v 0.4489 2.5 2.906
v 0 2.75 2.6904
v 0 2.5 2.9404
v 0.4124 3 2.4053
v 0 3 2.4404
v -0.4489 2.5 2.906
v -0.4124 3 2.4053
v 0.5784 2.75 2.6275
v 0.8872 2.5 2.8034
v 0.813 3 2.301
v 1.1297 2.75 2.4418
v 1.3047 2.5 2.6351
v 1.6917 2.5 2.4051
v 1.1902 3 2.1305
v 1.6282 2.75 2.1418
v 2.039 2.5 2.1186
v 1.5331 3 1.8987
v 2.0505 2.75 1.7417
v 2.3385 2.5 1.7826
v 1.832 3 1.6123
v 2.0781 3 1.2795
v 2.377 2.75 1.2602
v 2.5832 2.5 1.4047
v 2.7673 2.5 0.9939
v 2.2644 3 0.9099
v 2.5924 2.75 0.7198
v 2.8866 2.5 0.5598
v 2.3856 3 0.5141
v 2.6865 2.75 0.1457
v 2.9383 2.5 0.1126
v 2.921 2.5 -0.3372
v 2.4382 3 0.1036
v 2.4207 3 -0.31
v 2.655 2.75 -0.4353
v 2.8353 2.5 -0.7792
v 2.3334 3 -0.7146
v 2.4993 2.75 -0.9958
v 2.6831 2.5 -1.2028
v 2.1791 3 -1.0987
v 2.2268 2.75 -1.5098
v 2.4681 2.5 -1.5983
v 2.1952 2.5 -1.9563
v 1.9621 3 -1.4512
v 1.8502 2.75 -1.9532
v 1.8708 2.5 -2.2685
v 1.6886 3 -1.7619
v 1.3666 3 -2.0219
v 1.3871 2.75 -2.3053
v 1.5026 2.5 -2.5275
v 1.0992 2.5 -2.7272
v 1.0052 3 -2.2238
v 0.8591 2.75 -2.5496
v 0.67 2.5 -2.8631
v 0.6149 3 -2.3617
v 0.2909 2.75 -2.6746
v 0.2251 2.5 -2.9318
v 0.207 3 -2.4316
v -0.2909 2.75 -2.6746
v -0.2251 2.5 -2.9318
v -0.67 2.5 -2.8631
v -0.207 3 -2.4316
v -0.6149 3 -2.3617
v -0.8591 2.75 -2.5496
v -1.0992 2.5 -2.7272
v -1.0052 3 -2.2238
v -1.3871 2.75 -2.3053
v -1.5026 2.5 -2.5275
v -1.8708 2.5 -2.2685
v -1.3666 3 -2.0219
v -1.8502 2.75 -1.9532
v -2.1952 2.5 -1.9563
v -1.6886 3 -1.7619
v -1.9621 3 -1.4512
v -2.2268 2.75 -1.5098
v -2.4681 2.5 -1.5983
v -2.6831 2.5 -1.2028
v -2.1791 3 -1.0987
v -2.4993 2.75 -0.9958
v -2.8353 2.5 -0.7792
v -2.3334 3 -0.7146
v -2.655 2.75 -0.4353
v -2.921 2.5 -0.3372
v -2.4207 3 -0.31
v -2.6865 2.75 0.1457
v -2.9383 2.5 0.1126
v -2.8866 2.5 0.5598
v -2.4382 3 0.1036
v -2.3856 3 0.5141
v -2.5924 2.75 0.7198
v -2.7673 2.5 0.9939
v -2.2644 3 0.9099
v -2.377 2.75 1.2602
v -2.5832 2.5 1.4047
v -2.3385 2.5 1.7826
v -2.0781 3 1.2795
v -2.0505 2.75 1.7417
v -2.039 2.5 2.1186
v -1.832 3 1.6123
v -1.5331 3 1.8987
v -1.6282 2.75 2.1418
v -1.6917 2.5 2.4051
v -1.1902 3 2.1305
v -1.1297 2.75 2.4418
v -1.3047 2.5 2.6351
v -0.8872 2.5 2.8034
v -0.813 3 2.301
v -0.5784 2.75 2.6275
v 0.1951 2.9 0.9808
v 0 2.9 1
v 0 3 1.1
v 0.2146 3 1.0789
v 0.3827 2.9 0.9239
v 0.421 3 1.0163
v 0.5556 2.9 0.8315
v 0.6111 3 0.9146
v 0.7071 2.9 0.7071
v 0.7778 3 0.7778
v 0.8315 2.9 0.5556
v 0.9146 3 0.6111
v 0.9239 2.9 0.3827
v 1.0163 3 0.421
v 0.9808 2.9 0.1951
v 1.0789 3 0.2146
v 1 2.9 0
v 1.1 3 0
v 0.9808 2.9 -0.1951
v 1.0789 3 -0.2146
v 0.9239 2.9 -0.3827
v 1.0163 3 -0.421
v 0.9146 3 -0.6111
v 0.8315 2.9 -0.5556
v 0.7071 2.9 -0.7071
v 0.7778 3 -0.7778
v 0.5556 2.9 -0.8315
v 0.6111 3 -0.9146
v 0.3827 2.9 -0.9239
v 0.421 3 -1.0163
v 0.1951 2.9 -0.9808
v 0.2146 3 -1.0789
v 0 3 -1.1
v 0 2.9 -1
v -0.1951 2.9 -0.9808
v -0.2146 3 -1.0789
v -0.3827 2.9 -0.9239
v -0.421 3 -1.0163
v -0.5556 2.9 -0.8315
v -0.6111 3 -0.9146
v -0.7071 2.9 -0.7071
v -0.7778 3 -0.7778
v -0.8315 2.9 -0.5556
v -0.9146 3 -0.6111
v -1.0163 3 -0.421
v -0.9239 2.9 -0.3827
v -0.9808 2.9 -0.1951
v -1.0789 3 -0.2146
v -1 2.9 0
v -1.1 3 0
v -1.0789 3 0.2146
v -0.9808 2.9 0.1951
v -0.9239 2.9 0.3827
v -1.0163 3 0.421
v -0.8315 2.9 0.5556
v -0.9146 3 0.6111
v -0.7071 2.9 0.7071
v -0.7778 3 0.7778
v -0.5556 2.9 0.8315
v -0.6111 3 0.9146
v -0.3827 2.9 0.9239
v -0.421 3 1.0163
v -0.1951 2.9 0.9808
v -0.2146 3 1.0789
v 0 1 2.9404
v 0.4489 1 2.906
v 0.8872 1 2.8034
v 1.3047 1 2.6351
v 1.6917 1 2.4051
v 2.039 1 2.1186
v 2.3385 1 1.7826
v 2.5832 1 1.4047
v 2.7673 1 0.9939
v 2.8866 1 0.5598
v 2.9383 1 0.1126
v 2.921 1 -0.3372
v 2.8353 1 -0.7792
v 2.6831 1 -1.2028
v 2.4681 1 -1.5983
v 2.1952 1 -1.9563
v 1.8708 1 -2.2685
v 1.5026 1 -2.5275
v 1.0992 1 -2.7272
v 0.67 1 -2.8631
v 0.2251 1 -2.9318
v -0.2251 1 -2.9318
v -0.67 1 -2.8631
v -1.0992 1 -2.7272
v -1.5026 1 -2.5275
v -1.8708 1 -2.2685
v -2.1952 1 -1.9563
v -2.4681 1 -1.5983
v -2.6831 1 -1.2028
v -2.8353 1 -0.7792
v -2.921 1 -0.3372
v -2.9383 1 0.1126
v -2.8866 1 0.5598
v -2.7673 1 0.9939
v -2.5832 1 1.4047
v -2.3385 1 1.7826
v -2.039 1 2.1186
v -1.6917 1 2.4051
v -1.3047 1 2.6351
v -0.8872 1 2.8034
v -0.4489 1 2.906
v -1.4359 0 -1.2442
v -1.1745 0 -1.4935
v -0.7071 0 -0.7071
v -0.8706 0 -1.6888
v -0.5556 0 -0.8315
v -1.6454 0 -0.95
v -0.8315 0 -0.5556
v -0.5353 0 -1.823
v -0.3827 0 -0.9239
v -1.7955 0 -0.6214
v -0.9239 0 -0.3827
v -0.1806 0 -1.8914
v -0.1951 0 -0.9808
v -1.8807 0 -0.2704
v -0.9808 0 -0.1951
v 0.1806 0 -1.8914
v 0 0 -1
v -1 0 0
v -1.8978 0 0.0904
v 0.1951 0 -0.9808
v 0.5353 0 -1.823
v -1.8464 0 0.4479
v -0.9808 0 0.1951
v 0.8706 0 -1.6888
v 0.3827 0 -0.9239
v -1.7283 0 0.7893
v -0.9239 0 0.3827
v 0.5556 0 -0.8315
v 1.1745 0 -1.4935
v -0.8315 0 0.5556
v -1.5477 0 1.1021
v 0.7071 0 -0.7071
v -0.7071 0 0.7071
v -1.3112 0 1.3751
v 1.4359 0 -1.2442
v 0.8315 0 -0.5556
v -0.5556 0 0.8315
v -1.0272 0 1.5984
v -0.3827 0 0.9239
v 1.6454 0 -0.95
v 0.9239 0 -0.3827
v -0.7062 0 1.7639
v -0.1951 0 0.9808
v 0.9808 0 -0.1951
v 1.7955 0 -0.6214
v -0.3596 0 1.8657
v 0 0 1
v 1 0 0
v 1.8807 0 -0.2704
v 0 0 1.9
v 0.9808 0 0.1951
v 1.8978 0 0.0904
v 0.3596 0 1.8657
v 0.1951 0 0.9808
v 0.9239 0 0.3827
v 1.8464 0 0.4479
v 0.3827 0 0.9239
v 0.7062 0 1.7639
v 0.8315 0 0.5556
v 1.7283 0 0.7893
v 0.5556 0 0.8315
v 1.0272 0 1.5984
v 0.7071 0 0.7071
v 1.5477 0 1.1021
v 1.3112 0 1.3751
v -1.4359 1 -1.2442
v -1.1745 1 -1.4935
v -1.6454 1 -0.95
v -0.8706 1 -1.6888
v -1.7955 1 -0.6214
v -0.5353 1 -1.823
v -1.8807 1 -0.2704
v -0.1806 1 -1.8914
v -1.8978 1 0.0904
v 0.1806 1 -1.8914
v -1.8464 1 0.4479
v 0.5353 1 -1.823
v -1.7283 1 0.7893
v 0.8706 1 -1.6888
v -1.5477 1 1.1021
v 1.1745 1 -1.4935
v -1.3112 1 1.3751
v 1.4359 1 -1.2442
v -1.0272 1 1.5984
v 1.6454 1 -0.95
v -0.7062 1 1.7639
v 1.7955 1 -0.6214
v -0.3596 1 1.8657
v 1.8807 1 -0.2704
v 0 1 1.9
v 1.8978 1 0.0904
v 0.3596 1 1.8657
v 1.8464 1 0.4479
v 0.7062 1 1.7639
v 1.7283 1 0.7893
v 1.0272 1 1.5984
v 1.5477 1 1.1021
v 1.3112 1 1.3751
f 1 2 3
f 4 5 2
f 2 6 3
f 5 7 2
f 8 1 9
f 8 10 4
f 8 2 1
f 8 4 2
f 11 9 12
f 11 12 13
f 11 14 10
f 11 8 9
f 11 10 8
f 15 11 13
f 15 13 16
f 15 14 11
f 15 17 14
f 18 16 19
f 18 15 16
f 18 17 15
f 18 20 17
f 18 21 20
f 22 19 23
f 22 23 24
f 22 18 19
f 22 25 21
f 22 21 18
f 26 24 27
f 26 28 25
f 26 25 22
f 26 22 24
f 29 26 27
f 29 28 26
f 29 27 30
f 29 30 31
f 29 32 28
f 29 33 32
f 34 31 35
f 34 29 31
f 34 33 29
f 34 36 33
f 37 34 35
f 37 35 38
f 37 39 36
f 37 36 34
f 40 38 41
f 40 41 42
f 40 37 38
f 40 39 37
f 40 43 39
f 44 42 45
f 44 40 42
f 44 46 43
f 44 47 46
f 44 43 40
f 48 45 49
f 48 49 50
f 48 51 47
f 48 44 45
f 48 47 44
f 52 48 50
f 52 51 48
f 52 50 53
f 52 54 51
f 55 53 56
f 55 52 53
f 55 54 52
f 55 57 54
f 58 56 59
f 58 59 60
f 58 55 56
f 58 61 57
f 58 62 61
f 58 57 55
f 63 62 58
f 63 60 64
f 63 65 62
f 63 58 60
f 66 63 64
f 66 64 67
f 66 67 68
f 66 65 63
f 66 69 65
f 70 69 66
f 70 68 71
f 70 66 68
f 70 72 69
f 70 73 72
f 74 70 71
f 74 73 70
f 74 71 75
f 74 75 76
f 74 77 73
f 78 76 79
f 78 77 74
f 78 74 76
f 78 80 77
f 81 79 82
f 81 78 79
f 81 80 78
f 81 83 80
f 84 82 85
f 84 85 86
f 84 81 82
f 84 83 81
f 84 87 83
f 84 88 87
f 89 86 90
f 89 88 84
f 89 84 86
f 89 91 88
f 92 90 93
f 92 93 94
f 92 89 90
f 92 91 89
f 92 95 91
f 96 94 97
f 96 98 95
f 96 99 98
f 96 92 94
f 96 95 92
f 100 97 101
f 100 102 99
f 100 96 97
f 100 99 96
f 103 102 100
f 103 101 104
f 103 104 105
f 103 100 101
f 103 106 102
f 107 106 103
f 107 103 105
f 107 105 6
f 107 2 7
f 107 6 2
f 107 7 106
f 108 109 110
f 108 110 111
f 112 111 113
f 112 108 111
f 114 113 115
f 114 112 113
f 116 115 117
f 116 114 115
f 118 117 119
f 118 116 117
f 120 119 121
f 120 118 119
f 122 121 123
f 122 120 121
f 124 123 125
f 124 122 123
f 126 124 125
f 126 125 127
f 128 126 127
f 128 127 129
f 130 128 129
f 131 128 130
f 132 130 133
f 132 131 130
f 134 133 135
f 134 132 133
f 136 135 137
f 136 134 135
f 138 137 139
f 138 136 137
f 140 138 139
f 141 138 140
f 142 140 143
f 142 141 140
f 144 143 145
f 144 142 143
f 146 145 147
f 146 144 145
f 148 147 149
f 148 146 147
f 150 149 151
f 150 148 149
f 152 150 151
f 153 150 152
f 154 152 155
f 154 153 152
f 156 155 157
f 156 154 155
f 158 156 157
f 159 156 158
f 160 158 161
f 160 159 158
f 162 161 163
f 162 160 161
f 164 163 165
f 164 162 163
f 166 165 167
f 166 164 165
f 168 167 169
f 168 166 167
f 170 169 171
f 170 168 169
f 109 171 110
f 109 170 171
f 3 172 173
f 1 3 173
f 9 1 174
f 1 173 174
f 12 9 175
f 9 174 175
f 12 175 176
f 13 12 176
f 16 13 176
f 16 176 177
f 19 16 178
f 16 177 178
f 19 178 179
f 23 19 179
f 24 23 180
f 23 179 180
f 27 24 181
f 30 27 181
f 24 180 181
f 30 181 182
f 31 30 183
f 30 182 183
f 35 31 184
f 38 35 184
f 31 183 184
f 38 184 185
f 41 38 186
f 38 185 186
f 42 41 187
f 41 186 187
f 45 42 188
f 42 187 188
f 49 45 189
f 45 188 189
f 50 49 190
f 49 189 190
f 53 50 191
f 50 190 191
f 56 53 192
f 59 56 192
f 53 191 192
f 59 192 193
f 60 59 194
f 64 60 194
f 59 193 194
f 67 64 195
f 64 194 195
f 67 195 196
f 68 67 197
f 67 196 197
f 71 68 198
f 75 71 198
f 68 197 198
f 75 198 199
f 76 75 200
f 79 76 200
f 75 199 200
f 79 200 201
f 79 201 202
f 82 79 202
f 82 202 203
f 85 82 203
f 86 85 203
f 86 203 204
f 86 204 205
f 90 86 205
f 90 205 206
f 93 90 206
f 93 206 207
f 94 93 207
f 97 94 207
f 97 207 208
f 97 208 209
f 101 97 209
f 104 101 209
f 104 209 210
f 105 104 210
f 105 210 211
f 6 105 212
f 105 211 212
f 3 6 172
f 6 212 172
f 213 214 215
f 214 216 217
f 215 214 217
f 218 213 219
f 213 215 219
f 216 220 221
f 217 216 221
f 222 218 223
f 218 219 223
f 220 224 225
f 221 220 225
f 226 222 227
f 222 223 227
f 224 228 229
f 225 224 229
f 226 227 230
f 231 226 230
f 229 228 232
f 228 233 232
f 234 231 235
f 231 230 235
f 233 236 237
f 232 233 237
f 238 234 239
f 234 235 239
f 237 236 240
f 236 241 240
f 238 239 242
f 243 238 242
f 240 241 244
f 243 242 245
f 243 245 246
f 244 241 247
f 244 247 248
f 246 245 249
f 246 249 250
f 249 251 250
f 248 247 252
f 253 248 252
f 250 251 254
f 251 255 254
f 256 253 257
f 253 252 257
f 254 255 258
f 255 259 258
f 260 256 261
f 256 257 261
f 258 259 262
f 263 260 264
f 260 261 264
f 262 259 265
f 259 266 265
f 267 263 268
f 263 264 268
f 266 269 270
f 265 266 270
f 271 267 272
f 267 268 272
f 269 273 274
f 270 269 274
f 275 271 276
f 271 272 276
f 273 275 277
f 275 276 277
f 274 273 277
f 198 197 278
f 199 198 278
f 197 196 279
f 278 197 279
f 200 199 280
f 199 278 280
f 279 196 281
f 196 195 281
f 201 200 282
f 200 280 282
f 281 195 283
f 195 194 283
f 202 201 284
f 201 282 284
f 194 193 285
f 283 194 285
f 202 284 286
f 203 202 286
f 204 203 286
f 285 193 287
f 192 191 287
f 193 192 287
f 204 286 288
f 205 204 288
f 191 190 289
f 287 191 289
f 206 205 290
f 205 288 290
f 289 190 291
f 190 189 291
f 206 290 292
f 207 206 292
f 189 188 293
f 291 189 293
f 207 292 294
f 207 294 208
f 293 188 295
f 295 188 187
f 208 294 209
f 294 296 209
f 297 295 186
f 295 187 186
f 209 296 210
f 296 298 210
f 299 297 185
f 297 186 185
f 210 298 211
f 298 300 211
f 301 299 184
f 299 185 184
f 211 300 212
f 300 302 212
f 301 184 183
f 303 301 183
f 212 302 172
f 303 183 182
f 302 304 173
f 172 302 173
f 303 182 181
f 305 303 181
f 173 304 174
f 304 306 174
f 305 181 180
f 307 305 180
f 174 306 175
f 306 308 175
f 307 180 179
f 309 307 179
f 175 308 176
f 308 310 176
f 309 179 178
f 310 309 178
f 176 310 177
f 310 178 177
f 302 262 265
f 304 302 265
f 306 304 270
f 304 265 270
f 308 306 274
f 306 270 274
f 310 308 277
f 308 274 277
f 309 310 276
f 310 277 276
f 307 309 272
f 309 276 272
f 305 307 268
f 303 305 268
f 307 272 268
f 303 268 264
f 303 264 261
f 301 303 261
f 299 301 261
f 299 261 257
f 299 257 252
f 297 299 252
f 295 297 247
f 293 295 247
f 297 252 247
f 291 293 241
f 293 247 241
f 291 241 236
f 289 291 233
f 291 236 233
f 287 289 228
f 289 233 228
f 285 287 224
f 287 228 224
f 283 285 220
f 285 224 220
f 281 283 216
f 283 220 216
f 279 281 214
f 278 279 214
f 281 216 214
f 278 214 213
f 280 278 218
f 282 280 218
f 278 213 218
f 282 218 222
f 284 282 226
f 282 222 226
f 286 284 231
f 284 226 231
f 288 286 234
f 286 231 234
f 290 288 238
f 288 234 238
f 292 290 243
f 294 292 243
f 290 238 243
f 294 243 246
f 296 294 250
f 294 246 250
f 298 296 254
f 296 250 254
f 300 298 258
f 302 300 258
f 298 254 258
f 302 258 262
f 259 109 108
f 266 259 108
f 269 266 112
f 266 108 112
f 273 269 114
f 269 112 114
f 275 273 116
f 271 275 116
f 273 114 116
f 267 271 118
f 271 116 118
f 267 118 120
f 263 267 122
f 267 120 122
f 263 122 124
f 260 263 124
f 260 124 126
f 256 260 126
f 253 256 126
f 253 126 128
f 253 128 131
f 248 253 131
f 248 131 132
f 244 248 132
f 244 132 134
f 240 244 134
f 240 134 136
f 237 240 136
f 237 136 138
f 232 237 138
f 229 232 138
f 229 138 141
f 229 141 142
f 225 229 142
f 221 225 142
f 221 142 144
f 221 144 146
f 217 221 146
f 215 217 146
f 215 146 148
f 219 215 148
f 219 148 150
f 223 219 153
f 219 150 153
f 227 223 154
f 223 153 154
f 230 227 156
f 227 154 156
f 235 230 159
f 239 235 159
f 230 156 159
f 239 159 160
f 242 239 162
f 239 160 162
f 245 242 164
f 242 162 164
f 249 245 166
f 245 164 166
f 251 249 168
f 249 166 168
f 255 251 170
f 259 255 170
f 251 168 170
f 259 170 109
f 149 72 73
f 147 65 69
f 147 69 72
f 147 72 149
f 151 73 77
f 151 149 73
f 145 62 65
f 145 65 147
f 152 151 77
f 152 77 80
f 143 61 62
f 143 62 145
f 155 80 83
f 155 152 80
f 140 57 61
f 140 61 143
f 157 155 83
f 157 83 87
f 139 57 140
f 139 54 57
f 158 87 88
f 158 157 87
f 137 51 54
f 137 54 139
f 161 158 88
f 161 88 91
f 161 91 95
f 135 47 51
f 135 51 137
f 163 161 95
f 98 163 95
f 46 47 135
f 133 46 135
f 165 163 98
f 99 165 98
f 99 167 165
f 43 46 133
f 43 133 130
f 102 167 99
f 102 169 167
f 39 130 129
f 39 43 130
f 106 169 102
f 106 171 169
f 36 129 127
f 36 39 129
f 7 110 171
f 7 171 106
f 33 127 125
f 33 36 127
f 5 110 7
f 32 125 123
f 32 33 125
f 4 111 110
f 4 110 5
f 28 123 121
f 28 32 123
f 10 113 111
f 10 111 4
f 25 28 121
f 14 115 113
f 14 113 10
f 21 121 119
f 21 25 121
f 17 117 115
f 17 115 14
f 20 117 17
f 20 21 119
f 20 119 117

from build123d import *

# Parameters (mm, degrees)
SKETCH1_R           = 1.9
BOSS_EXTRUDE1_DEPTH = 1
SKETCH2_R           = 2.940420278
BOSS_EXTRUDE2_DEPTH = 2
CHAMFER1_SIZE       = 0.5
SKETCH3_R           = 1
CUT_EXTRUDE1_DEPTH  = 4
CHAMFER2_SIZE       = 0.1


with BuildPart() as part:
    # Sketch1 → Boss-Extrude1 (new body)
    with BuildSketch(Plane(origin=(0, 0, 0), x_dir=(1, 0, 0), z_dir=(0, 1, 0))):
        with Locations(Location((0, 0, 0), (0, 0, 270))):
            Circle(SKETCH1_R)
    extrude(amount=BOSS_EXTRUDE1_DEPTH)

    # Sketch2 → Boss-Extrude2 (add)
    with BuildSketch(Plane(origin=(0, 1, 0), x_dir=(1, 0, 0), z_dir=(0, 1, 0))):
        with Locations(Location((0, 0, 0), (0, 0, 270))):
            Circle(SKETCH2_R)
    extrude(amount=BOSS_EXTRUDE2_DEPTH)

    # Chamfer1
    chamfer1_edges = [part.edges().sort_by_distance(p)[0] for p in [
        (0, 3, -2.940420278),
    ]]
    chamfer(chamfer1_edges, length=CHAMFER1_SIZE)

    # Sketch3 → Cut-Extrude1 (cut)
    with BuildSketch(Plane(origin=(0, 3, 0), x_dir=(1, 0, 0), z_dir=(0, 1, 0))):
        with Locations(Location((0, 0, 0), (0, 0, 270))):
            Circle(SKETCH3_R)
    extrude(amount=-CUT_EXTRUDE1_DEPTH, mode=Mode.SUBTRACT)

    # Chamfer2
    chamfer2_edges = [part.edges().sort_by_distance(p)[0] for p in [
        (0, 3, -1),
    ]]
    chamfer(chamfer2_edges, length=CHAMFER2_SIZE)


solid = part.part
